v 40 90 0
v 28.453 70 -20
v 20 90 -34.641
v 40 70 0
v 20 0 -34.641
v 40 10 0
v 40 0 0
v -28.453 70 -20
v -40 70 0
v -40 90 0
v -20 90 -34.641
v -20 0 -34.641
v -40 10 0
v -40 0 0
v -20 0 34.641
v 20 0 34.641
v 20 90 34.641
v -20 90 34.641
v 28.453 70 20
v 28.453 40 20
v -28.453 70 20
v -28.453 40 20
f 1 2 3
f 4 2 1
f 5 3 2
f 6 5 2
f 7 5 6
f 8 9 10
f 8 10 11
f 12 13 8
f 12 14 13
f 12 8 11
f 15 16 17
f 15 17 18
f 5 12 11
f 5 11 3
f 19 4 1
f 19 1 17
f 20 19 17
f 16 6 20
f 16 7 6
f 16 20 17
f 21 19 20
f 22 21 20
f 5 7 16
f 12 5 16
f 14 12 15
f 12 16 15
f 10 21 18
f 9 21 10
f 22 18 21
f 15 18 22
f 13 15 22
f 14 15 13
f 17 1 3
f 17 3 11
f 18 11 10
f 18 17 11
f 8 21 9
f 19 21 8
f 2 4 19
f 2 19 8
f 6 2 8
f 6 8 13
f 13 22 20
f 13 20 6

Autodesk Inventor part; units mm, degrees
ref_plane "YZ Plane" through (0, 0, 0) normal (1, 0, 0) x (0, 1, 0)
ref_plane "XZ Plane" through (0, 0, 0) normal (0, 1, 0) x (-1, 0, 0)
ref_plane "XY Plane" through (0, 0, 0) normal (0, 0, 1) x (1, 0, 0)
sketch "Эскиз1" plane through (0, 0, 0) normal (0, 1, 0) x (-1, 0, 0)
  circle A0 centre (0, 0) radius 40
  line L0 (40, 0) -> (20, -34.641)
  line L1 (20, -34.641) -> (-20, -34.641)
  line L2 (-20, -34.641) -> (-40, 0)
  line L3 (-40, 0) -> (-20, 34.641)
  line L4 (-20, 34.641) -> (20, 34.641)
  line L5 (20, 34.641) -> (40, 0)
  dimension "d0" = 80
extrude "Выдавливание1" add sketch "Эскиз1" along normal blind 90 contours L0 L1 L2 L3 L4 L5
sketch "Эскиз3" plane through (0, 0, 0) normal (1, 0, 0) x (0, 1, 0)
  line L0 (0, 0) -> (10, 0)
  line L1 (90, 0) -> (70, 0)
  line L2 (70, 0) -> (70, -20)
  line L3 (70, -20) -> (10, 0)
  line L4 (70, 0) -> (70, 20)
  line L5 (70, 20) -> (40, 20)
  line L6 (40, 20) -> (10, 0)
extrude "Выдавливание3" cut sketch "Эскиз3" against normal mid plane 90
